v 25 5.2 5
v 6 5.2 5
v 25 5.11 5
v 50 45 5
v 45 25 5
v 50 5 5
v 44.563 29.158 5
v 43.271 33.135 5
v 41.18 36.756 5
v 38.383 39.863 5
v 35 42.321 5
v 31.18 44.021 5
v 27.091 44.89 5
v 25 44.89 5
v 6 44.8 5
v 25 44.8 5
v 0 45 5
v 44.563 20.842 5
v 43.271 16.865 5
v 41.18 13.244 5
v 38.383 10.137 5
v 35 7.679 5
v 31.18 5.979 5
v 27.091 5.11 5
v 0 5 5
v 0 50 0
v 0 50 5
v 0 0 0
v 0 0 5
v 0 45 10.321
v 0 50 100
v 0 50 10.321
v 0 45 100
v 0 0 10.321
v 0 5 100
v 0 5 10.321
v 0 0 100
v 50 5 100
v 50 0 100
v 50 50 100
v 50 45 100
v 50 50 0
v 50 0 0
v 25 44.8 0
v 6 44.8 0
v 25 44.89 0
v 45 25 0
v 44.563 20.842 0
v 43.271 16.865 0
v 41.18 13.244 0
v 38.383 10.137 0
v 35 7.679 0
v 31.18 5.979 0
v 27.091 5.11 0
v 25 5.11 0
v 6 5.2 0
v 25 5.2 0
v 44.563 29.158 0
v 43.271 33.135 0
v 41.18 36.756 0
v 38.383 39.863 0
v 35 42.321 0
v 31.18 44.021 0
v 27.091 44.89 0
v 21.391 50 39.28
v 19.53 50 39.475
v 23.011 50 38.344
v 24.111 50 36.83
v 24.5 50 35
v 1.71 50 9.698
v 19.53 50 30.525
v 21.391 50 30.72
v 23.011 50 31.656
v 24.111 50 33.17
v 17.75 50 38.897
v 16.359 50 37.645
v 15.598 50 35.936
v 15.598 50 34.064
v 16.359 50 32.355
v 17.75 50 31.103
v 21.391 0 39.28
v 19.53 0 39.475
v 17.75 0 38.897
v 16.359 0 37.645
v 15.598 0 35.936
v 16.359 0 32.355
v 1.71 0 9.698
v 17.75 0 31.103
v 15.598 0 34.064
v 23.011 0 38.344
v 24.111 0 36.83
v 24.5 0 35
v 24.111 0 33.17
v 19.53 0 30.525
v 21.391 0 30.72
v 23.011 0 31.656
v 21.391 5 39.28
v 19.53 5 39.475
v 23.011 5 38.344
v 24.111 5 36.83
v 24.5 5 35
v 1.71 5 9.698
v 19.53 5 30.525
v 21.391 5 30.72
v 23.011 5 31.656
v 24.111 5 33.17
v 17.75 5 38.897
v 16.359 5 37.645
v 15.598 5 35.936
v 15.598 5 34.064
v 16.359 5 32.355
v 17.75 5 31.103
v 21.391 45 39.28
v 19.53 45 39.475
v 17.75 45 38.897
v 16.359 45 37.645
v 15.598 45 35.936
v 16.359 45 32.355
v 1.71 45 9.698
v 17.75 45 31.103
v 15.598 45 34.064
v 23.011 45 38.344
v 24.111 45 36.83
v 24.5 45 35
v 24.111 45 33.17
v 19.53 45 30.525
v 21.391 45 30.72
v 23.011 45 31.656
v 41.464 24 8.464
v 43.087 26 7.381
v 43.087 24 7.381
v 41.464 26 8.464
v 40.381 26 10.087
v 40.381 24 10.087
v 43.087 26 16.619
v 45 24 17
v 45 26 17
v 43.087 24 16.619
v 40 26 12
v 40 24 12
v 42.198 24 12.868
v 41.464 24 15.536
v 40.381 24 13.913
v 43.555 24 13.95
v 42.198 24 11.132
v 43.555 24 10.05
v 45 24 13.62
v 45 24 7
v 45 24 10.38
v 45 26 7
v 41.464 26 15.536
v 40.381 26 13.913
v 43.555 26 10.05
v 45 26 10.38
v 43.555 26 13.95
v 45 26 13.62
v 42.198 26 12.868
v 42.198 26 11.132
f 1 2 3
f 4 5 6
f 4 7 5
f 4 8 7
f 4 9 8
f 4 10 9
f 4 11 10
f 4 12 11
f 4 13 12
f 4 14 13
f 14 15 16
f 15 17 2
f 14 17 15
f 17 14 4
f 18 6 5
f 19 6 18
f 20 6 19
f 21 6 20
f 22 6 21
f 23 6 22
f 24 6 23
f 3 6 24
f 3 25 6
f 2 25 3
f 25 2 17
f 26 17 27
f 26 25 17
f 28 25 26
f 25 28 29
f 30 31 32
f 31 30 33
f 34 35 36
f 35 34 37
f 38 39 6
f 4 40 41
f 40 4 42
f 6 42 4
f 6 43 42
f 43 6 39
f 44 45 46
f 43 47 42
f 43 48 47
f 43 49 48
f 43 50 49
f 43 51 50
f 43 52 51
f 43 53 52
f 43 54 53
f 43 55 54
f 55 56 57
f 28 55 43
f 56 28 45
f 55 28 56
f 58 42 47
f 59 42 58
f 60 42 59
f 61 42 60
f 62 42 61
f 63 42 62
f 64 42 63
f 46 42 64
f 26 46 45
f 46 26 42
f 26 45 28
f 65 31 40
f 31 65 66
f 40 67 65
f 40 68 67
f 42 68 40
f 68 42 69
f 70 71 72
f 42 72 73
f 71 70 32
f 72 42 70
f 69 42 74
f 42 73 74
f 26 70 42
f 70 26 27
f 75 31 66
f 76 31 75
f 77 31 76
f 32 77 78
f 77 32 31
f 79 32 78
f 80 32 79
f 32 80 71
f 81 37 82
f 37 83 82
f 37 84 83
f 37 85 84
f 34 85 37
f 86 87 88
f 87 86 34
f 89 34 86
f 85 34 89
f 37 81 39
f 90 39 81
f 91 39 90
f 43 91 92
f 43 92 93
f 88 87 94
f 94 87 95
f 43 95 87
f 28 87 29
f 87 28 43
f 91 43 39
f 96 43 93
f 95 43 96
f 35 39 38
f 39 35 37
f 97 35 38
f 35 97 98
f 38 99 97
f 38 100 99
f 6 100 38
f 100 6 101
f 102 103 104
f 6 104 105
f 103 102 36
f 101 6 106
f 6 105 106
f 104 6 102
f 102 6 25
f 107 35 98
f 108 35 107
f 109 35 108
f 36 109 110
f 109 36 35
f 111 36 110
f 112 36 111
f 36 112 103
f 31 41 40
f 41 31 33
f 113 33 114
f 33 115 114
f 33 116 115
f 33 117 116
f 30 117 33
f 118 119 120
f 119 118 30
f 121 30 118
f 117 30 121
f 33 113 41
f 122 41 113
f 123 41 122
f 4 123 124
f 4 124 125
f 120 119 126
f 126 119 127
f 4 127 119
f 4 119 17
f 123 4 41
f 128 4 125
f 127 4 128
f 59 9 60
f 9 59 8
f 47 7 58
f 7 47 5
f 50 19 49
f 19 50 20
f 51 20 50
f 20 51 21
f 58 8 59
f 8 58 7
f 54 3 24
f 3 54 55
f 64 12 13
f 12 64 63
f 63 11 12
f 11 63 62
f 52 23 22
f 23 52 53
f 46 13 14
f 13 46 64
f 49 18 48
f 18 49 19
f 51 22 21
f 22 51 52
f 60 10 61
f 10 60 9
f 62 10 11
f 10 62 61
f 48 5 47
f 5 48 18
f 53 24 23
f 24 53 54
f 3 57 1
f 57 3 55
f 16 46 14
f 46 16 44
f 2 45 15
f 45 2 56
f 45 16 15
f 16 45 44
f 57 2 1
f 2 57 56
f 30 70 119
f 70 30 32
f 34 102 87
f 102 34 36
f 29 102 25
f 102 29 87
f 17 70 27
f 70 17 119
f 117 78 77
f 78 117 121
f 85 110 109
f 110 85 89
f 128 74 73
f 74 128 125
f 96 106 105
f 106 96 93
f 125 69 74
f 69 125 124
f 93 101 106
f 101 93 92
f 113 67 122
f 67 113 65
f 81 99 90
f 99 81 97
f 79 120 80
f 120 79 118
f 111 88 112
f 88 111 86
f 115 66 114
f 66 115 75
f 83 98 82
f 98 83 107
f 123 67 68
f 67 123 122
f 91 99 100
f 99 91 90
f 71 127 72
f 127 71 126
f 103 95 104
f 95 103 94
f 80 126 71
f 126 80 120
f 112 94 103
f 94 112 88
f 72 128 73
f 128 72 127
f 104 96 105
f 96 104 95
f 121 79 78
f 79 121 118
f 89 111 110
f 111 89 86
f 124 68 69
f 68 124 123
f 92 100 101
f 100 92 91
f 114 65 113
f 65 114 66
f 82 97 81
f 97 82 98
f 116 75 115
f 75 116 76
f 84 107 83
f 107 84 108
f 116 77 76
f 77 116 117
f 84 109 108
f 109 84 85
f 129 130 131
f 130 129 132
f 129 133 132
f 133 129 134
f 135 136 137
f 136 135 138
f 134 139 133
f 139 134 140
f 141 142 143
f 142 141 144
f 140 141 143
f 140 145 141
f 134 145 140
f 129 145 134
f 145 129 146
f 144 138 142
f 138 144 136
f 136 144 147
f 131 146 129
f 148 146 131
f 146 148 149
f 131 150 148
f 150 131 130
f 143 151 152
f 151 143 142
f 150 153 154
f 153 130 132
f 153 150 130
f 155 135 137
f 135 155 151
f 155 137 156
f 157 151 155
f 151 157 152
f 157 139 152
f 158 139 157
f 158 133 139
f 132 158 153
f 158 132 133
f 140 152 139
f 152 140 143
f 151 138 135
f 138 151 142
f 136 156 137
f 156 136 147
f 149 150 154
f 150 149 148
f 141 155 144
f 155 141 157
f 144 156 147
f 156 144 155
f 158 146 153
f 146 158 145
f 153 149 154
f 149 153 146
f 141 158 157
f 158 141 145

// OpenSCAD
base_plate_width = 0;
base_plate_length = 50;
base_plate_height = 5;
base_plate_dimensions = [base_plate_width,base_plate_length,base_plate_height];

up_plate_width = 5;
up_plate_length = 50;
up_plate_height = 50;
up_plate_dimensions = [up_plate_width,up_plate_length,up_plate_height];

wall_plate_width= 100;
wall_plate_length = 5;
wall_plate_height = 50;

wall_plate_dimensions = [wall_plate_width,wall_plate_length,wall_plate_height];


module halfcylinder(he,rd) {
difference(){
cylinder (h=he,r=rd);
translate ([0,-rd-0.1,-0.1]) cube([rd+0.1,rd*2+0.2,he+0.2]);
} // df
} // mod
cylinder_radius = 15;
cylinder_height = 5;

translate([50,0,0])
rotate([0,270,0])
difference(){
	union(){
		cube(base_plate_dimensions);
		cube(up_plate_dimensions);
		cube(wall_plate_dimensions);
		
		translate([0,45,0])
		cube(wall_plate_dimensions);
	}
	
	translate([5,-1,50])
	rotate([0,-340,0])
	cube([base_plate_width+5, base_plate_length+10, base_plate_height+50]);	
	translate([35,-10,30])
	color("purple")
	rotate([270,90,0])
	cylinder(h=70, r=4.5);
	
	union(){
	translate([10,25,25])
	rotate([0,270,0])
	color("black")
	halfcylinder(15, 20);
	
	color("green")
	translate([-2,5.2,24])
	cube([10,39.6,20]);
	}
};


translate([50,0,0])
rotate([0,270,0])
difference(){
		translate([12,base_plate_length/2-1,5])
		rotate([270,90,0])
		color("pink")
		halfcylinder(2,5);
		
		translate([12, base_plate_length/2, 6])
		rotate([90,90,0])
		cylinder(d = 4, h=10 + 5, center = true);		
};
